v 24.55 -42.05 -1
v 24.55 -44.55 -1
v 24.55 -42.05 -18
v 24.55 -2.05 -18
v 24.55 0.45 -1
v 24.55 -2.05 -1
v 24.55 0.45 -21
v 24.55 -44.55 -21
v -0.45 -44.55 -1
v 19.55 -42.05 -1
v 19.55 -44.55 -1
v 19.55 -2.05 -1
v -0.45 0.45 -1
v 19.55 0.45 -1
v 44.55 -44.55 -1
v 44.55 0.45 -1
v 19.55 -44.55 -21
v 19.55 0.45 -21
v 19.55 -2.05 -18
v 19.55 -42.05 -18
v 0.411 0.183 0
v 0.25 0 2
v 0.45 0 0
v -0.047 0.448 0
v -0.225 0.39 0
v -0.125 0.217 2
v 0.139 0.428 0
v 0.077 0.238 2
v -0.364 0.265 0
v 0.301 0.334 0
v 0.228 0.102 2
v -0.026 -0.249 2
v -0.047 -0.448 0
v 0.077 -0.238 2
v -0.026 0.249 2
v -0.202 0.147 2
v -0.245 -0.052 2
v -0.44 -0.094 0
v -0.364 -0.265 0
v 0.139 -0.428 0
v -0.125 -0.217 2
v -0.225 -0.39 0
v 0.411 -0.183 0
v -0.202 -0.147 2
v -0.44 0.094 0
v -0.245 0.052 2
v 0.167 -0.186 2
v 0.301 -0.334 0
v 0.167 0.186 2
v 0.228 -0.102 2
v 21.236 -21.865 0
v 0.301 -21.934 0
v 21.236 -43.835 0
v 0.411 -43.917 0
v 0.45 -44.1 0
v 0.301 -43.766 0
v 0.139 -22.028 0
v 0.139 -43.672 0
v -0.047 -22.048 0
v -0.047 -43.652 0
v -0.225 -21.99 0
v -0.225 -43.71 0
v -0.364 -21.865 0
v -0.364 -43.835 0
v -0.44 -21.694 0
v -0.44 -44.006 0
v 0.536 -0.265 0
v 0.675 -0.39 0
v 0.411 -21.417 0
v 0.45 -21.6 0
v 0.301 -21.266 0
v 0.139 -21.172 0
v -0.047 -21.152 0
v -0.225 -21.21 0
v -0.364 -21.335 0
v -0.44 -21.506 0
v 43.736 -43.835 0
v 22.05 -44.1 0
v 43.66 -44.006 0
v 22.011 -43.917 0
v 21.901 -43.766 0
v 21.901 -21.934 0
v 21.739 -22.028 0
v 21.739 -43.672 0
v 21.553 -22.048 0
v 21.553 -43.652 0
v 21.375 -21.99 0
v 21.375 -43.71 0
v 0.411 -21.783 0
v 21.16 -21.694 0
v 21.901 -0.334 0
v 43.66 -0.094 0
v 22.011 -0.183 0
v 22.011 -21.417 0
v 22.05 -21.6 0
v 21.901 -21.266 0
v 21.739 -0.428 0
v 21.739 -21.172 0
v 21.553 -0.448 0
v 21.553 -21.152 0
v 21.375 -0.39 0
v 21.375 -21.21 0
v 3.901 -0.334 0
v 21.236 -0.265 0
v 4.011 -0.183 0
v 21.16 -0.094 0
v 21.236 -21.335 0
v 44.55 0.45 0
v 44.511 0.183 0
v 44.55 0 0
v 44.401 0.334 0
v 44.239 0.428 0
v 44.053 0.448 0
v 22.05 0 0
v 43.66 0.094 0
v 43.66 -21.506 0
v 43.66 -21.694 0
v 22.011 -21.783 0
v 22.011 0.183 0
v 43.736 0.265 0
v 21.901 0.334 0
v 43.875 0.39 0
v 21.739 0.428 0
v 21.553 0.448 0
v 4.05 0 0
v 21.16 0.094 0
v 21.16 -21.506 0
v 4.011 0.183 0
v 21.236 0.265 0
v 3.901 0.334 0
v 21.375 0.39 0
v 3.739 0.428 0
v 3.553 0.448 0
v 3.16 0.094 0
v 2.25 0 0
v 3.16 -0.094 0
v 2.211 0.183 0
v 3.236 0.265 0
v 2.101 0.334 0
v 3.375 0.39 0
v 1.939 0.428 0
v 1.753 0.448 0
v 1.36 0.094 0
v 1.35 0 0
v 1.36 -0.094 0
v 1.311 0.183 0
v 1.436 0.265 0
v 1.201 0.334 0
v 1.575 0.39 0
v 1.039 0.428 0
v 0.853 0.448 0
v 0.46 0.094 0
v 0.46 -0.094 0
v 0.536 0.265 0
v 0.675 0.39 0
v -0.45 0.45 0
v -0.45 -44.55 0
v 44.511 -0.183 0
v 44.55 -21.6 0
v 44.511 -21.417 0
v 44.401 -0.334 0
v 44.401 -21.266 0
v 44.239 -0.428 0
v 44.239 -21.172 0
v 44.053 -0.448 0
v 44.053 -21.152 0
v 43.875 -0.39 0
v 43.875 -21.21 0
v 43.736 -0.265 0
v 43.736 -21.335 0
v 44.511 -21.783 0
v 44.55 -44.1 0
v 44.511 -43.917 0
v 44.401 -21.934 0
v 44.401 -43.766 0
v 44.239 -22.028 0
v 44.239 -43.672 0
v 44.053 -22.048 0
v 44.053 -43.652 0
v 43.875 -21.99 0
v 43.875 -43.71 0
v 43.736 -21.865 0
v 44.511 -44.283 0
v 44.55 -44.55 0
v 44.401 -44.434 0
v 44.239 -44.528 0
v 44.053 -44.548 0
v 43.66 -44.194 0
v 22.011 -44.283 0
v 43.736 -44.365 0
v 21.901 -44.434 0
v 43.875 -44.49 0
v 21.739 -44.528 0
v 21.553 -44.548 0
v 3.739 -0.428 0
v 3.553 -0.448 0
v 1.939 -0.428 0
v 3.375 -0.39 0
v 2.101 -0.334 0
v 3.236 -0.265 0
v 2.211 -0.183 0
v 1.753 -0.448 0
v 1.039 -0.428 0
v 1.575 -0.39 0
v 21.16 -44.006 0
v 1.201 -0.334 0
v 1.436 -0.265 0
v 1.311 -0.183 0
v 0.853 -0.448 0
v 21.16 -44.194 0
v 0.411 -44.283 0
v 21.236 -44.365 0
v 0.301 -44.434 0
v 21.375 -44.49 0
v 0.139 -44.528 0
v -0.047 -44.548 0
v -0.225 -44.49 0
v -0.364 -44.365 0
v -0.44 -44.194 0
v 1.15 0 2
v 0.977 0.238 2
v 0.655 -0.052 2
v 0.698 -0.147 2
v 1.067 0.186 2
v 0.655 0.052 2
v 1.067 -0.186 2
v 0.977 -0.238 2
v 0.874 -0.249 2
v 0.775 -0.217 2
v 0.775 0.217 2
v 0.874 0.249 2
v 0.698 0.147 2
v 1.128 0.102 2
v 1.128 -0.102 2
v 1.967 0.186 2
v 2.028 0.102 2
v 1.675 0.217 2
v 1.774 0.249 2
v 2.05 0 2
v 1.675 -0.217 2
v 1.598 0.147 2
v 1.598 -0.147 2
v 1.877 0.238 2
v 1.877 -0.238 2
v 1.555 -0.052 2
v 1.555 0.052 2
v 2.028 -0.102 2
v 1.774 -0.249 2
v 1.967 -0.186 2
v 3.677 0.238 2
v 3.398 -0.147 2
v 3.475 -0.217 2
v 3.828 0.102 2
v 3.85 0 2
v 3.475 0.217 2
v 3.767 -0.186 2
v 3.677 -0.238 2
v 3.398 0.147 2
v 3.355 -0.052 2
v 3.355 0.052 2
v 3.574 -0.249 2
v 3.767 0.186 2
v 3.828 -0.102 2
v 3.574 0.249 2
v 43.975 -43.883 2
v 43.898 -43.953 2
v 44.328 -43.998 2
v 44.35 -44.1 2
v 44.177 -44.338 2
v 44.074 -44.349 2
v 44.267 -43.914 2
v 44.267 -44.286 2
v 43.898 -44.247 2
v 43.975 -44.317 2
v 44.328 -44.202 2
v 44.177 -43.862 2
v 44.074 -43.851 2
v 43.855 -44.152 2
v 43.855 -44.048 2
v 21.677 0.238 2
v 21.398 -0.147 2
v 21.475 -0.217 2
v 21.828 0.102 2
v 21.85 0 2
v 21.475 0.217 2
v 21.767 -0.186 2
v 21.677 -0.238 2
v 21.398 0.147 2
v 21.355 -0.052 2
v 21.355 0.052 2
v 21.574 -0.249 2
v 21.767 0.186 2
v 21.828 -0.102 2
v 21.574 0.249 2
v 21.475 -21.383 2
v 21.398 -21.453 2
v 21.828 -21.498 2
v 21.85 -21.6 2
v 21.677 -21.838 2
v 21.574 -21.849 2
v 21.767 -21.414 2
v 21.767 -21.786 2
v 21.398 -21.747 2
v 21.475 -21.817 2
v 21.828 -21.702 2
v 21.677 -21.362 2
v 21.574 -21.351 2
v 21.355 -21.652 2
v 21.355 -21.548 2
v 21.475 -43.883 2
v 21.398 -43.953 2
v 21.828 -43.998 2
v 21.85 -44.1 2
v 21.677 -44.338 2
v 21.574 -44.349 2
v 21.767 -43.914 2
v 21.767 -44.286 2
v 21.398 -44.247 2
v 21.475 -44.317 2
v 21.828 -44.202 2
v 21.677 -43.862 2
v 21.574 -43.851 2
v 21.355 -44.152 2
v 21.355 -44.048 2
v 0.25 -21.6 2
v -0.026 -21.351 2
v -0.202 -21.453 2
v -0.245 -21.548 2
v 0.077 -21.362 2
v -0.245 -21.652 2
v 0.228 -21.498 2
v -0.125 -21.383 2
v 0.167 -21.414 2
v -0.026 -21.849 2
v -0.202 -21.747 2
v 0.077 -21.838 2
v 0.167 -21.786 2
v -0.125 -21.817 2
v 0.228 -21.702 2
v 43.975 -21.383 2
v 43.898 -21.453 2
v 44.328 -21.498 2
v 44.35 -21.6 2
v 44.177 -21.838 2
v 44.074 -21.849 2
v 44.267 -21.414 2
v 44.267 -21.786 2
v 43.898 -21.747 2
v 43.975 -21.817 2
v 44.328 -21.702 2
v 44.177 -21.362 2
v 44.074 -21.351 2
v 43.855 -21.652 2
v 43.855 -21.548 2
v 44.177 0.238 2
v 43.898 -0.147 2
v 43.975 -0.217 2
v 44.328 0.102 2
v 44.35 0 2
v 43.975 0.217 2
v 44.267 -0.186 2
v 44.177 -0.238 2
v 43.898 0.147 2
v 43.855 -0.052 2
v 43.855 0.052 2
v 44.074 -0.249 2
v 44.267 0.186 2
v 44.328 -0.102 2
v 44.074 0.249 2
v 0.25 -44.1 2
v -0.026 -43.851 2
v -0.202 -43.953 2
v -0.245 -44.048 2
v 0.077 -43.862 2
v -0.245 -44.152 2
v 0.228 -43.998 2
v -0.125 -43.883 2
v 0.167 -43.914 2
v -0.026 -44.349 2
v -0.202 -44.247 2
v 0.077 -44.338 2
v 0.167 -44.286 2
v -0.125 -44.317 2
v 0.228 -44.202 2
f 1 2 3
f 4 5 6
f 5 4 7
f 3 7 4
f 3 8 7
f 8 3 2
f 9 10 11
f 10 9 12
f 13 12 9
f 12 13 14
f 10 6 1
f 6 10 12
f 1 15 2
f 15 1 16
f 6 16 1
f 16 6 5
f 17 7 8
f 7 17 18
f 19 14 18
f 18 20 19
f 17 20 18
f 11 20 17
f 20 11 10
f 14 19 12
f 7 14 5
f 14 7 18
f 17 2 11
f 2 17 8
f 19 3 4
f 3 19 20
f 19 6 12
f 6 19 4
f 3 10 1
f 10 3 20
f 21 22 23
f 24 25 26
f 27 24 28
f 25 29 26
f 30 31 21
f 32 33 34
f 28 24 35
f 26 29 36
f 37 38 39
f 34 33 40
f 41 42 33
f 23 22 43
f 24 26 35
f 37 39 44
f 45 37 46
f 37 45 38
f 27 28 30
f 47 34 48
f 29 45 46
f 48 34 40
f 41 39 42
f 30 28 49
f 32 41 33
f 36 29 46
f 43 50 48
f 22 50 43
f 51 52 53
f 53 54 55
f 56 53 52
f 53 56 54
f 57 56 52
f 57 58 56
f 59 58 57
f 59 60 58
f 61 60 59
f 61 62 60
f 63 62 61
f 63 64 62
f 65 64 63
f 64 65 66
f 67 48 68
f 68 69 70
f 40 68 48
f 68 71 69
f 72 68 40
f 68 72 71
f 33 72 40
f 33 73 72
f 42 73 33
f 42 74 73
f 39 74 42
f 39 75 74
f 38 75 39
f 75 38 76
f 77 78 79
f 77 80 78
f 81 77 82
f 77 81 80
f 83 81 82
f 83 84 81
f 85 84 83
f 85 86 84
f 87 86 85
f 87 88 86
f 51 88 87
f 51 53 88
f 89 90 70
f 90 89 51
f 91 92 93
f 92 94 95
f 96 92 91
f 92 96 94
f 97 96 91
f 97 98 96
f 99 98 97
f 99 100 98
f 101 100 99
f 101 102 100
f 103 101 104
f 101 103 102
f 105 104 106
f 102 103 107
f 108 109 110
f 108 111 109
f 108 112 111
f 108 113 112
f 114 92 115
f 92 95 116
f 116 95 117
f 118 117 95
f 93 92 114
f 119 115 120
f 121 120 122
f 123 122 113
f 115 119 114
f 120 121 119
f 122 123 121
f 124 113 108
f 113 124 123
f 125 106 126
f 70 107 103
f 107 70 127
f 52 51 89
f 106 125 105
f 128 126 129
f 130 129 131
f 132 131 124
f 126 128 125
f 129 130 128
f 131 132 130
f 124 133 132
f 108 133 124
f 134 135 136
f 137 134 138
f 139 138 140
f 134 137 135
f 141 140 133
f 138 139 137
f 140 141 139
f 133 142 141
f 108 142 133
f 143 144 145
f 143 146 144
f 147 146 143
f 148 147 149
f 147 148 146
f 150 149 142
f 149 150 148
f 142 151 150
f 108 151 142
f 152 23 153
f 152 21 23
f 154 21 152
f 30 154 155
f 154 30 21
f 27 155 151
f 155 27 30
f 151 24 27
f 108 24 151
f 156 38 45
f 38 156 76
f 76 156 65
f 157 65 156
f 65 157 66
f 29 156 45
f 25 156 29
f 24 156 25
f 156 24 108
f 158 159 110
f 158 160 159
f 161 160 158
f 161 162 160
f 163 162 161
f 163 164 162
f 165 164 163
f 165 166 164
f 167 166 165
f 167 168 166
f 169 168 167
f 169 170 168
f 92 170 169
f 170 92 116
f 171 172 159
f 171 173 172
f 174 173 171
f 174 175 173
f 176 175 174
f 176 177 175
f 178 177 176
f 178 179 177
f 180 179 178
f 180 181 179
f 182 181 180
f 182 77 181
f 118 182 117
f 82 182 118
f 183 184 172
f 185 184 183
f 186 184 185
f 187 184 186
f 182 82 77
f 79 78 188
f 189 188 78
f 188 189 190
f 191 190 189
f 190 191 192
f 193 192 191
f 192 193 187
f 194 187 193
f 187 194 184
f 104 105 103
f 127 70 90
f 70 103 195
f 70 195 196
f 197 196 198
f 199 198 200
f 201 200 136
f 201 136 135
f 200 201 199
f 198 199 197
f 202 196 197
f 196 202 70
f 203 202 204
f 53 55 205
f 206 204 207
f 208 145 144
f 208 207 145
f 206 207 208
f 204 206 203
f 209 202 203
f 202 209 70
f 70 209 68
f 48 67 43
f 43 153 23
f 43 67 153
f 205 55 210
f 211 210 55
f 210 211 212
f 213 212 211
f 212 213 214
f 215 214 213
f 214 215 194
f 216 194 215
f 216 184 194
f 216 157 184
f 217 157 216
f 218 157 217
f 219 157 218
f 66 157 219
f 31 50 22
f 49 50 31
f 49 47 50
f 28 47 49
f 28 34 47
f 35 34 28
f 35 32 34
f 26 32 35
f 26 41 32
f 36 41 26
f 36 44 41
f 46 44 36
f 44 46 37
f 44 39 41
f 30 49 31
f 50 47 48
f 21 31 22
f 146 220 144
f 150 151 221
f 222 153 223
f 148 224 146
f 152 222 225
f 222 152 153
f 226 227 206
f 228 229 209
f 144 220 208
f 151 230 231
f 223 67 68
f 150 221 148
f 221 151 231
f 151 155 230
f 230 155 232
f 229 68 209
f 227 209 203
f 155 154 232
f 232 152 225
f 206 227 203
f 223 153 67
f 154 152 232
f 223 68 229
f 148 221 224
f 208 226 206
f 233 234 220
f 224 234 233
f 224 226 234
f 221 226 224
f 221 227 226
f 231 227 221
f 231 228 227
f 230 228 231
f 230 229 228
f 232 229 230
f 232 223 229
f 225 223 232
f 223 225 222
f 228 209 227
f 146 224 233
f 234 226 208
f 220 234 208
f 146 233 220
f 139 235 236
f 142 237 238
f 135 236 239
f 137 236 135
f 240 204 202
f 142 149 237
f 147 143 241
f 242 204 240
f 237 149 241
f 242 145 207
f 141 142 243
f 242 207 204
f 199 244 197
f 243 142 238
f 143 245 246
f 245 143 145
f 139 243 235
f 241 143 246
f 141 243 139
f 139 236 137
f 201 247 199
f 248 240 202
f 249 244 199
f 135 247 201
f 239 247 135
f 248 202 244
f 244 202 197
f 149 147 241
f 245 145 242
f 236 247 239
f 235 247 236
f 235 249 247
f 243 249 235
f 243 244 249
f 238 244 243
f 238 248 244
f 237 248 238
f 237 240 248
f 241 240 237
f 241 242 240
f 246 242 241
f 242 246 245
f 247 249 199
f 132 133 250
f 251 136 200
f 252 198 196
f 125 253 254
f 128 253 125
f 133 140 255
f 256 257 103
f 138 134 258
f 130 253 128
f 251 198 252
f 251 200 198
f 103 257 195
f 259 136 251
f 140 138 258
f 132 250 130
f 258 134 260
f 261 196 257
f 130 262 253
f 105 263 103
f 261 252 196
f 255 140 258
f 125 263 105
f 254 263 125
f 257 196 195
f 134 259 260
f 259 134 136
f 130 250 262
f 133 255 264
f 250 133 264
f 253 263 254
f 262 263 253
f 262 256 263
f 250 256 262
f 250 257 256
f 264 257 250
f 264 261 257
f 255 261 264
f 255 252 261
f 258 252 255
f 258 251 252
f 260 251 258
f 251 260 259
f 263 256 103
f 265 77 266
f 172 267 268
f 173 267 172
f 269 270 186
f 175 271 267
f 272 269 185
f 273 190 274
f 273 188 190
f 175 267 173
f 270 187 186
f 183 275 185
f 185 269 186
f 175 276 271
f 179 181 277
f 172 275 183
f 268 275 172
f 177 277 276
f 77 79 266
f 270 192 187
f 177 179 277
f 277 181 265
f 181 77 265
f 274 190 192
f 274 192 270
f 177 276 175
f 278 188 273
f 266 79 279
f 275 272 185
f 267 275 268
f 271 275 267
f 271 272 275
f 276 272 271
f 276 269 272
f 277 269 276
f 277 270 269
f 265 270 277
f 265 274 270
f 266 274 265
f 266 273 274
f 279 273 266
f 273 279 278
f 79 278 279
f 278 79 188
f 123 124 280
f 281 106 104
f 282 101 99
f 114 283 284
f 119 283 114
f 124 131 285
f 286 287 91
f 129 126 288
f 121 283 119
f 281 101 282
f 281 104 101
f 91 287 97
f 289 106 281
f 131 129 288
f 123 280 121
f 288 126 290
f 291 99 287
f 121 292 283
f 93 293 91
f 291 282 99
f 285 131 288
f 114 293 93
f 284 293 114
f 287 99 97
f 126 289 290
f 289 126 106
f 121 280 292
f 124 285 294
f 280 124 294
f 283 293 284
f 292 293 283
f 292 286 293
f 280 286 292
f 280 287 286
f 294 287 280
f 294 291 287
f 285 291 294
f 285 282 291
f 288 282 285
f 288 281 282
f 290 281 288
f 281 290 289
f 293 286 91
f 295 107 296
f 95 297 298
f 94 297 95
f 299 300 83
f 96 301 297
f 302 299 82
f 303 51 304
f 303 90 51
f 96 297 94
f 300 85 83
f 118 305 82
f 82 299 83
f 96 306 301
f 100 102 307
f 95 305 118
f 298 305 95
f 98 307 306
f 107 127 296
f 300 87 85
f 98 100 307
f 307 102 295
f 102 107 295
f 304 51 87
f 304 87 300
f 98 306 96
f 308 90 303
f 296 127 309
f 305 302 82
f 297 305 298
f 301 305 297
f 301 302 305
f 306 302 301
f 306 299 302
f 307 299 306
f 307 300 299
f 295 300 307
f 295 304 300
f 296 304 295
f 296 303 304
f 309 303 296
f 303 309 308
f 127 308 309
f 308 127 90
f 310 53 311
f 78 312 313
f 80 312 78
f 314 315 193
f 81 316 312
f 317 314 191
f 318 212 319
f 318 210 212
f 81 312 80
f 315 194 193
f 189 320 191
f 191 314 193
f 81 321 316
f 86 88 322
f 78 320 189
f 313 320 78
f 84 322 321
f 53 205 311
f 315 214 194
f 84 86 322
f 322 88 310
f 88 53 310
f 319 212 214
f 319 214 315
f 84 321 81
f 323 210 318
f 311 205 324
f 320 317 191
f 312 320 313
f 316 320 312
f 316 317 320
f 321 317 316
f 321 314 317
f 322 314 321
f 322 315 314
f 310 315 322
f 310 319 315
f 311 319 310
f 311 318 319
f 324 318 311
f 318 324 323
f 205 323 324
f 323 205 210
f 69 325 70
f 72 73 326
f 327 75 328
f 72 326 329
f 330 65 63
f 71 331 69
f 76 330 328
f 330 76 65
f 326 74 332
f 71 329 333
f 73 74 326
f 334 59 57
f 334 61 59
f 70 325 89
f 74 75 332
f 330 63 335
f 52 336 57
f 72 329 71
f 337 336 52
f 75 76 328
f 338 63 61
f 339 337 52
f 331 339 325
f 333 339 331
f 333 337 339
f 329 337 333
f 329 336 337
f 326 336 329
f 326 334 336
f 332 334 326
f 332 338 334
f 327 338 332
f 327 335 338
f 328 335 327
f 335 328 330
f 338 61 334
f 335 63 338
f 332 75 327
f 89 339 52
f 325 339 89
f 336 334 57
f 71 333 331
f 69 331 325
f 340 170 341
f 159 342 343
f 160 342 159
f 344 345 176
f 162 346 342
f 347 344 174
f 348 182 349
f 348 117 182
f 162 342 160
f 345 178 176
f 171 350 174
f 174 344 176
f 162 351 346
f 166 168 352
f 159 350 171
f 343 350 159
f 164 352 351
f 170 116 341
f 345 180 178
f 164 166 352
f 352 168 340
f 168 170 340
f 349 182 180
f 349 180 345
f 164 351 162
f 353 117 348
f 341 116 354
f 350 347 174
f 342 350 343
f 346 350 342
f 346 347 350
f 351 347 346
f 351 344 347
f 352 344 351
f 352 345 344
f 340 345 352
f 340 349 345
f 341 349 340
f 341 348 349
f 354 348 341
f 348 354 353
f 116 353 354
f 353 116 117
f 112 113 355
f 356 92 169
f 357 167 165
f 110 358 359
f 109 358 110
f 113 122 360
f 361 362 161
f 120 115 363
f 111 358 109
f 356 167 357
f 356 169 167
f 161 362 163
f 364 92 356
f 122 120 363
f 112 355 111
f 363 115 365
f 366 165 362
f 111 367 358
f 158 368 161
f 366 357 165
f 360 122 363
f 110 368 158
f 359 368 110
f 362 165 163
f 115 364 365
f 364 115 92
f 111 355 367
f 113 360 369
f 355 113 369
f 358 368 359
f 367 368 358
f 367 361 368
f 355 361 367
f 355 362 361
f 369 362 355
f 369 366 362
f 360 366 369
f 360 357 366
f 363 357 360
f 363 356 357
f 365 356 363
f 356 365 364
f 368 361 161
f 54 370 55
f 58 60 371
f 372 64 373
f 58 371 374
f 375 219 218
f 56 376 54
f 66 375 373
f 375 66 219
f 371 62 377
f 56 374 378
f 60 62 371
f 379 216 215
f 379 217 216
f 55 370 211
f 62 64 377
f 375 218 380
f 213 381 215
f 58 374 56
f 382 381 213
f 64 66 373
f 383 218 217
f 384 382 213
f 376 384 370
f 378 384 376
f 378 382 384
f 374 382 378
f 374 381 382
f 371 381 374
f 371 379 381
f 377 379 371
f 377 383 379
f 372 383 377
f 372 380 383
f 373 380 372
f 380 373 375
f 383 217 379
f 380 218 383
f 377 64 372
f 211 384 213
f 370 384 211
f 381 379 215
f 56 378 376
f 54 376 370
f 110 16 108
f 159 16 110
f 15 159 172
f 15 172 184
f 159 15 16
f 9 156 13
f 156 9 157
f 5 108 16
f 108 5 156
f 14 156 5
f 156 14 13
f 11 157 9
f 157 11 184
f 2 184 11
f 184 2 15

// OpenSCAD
$fn=15;
gridLength = 45;
gridSquares = 50;
oneGridLength = gridLength / gridSquares;
platformThickness = 1;
handleThickness = 5;
handleHeight = 20;

module buildPlatform(){
  translate([22.05,-22.05, -0.5 * platformThickness])
  cube([45,45,platformThickness], center = true);  
    
}

module buildHandle(){
    translate([22.05,-22.05,-0.5 * handleHeight - platformThickness])
    difference(){
        cube([handleThickness, 45, handleHeight], center = true);
        translate([0,0,4])
        cube([handleThickness + 1, 40, 22], center = true);
    }
    
    
}

module buildStamp(coordinates){
  buildPlatform();
  buildHandle();
  
  for (i=[0:1:len(coordinates) - 1]){
    coordinate = coordinates[i];
    rowNumber = coordinate[0];
    columnNumber = coordinate[1];
    translate([columnNumber * oneGridLength,rowNumber * -1 * oneGridLength,0])
        cylinder(h=2,d1=oneGridLength, d2 = 0.5);
      
  }
    
}

//Coordinates example: 
buildStamp(wire_coordinates);

wire_coordinates = [[0,0], [0,1], [0,2], [0,4], [49,49], [0, 24], [24, 24], [49, 24], [24, 0], [24, 49], [0, 49], [49, 0]];
